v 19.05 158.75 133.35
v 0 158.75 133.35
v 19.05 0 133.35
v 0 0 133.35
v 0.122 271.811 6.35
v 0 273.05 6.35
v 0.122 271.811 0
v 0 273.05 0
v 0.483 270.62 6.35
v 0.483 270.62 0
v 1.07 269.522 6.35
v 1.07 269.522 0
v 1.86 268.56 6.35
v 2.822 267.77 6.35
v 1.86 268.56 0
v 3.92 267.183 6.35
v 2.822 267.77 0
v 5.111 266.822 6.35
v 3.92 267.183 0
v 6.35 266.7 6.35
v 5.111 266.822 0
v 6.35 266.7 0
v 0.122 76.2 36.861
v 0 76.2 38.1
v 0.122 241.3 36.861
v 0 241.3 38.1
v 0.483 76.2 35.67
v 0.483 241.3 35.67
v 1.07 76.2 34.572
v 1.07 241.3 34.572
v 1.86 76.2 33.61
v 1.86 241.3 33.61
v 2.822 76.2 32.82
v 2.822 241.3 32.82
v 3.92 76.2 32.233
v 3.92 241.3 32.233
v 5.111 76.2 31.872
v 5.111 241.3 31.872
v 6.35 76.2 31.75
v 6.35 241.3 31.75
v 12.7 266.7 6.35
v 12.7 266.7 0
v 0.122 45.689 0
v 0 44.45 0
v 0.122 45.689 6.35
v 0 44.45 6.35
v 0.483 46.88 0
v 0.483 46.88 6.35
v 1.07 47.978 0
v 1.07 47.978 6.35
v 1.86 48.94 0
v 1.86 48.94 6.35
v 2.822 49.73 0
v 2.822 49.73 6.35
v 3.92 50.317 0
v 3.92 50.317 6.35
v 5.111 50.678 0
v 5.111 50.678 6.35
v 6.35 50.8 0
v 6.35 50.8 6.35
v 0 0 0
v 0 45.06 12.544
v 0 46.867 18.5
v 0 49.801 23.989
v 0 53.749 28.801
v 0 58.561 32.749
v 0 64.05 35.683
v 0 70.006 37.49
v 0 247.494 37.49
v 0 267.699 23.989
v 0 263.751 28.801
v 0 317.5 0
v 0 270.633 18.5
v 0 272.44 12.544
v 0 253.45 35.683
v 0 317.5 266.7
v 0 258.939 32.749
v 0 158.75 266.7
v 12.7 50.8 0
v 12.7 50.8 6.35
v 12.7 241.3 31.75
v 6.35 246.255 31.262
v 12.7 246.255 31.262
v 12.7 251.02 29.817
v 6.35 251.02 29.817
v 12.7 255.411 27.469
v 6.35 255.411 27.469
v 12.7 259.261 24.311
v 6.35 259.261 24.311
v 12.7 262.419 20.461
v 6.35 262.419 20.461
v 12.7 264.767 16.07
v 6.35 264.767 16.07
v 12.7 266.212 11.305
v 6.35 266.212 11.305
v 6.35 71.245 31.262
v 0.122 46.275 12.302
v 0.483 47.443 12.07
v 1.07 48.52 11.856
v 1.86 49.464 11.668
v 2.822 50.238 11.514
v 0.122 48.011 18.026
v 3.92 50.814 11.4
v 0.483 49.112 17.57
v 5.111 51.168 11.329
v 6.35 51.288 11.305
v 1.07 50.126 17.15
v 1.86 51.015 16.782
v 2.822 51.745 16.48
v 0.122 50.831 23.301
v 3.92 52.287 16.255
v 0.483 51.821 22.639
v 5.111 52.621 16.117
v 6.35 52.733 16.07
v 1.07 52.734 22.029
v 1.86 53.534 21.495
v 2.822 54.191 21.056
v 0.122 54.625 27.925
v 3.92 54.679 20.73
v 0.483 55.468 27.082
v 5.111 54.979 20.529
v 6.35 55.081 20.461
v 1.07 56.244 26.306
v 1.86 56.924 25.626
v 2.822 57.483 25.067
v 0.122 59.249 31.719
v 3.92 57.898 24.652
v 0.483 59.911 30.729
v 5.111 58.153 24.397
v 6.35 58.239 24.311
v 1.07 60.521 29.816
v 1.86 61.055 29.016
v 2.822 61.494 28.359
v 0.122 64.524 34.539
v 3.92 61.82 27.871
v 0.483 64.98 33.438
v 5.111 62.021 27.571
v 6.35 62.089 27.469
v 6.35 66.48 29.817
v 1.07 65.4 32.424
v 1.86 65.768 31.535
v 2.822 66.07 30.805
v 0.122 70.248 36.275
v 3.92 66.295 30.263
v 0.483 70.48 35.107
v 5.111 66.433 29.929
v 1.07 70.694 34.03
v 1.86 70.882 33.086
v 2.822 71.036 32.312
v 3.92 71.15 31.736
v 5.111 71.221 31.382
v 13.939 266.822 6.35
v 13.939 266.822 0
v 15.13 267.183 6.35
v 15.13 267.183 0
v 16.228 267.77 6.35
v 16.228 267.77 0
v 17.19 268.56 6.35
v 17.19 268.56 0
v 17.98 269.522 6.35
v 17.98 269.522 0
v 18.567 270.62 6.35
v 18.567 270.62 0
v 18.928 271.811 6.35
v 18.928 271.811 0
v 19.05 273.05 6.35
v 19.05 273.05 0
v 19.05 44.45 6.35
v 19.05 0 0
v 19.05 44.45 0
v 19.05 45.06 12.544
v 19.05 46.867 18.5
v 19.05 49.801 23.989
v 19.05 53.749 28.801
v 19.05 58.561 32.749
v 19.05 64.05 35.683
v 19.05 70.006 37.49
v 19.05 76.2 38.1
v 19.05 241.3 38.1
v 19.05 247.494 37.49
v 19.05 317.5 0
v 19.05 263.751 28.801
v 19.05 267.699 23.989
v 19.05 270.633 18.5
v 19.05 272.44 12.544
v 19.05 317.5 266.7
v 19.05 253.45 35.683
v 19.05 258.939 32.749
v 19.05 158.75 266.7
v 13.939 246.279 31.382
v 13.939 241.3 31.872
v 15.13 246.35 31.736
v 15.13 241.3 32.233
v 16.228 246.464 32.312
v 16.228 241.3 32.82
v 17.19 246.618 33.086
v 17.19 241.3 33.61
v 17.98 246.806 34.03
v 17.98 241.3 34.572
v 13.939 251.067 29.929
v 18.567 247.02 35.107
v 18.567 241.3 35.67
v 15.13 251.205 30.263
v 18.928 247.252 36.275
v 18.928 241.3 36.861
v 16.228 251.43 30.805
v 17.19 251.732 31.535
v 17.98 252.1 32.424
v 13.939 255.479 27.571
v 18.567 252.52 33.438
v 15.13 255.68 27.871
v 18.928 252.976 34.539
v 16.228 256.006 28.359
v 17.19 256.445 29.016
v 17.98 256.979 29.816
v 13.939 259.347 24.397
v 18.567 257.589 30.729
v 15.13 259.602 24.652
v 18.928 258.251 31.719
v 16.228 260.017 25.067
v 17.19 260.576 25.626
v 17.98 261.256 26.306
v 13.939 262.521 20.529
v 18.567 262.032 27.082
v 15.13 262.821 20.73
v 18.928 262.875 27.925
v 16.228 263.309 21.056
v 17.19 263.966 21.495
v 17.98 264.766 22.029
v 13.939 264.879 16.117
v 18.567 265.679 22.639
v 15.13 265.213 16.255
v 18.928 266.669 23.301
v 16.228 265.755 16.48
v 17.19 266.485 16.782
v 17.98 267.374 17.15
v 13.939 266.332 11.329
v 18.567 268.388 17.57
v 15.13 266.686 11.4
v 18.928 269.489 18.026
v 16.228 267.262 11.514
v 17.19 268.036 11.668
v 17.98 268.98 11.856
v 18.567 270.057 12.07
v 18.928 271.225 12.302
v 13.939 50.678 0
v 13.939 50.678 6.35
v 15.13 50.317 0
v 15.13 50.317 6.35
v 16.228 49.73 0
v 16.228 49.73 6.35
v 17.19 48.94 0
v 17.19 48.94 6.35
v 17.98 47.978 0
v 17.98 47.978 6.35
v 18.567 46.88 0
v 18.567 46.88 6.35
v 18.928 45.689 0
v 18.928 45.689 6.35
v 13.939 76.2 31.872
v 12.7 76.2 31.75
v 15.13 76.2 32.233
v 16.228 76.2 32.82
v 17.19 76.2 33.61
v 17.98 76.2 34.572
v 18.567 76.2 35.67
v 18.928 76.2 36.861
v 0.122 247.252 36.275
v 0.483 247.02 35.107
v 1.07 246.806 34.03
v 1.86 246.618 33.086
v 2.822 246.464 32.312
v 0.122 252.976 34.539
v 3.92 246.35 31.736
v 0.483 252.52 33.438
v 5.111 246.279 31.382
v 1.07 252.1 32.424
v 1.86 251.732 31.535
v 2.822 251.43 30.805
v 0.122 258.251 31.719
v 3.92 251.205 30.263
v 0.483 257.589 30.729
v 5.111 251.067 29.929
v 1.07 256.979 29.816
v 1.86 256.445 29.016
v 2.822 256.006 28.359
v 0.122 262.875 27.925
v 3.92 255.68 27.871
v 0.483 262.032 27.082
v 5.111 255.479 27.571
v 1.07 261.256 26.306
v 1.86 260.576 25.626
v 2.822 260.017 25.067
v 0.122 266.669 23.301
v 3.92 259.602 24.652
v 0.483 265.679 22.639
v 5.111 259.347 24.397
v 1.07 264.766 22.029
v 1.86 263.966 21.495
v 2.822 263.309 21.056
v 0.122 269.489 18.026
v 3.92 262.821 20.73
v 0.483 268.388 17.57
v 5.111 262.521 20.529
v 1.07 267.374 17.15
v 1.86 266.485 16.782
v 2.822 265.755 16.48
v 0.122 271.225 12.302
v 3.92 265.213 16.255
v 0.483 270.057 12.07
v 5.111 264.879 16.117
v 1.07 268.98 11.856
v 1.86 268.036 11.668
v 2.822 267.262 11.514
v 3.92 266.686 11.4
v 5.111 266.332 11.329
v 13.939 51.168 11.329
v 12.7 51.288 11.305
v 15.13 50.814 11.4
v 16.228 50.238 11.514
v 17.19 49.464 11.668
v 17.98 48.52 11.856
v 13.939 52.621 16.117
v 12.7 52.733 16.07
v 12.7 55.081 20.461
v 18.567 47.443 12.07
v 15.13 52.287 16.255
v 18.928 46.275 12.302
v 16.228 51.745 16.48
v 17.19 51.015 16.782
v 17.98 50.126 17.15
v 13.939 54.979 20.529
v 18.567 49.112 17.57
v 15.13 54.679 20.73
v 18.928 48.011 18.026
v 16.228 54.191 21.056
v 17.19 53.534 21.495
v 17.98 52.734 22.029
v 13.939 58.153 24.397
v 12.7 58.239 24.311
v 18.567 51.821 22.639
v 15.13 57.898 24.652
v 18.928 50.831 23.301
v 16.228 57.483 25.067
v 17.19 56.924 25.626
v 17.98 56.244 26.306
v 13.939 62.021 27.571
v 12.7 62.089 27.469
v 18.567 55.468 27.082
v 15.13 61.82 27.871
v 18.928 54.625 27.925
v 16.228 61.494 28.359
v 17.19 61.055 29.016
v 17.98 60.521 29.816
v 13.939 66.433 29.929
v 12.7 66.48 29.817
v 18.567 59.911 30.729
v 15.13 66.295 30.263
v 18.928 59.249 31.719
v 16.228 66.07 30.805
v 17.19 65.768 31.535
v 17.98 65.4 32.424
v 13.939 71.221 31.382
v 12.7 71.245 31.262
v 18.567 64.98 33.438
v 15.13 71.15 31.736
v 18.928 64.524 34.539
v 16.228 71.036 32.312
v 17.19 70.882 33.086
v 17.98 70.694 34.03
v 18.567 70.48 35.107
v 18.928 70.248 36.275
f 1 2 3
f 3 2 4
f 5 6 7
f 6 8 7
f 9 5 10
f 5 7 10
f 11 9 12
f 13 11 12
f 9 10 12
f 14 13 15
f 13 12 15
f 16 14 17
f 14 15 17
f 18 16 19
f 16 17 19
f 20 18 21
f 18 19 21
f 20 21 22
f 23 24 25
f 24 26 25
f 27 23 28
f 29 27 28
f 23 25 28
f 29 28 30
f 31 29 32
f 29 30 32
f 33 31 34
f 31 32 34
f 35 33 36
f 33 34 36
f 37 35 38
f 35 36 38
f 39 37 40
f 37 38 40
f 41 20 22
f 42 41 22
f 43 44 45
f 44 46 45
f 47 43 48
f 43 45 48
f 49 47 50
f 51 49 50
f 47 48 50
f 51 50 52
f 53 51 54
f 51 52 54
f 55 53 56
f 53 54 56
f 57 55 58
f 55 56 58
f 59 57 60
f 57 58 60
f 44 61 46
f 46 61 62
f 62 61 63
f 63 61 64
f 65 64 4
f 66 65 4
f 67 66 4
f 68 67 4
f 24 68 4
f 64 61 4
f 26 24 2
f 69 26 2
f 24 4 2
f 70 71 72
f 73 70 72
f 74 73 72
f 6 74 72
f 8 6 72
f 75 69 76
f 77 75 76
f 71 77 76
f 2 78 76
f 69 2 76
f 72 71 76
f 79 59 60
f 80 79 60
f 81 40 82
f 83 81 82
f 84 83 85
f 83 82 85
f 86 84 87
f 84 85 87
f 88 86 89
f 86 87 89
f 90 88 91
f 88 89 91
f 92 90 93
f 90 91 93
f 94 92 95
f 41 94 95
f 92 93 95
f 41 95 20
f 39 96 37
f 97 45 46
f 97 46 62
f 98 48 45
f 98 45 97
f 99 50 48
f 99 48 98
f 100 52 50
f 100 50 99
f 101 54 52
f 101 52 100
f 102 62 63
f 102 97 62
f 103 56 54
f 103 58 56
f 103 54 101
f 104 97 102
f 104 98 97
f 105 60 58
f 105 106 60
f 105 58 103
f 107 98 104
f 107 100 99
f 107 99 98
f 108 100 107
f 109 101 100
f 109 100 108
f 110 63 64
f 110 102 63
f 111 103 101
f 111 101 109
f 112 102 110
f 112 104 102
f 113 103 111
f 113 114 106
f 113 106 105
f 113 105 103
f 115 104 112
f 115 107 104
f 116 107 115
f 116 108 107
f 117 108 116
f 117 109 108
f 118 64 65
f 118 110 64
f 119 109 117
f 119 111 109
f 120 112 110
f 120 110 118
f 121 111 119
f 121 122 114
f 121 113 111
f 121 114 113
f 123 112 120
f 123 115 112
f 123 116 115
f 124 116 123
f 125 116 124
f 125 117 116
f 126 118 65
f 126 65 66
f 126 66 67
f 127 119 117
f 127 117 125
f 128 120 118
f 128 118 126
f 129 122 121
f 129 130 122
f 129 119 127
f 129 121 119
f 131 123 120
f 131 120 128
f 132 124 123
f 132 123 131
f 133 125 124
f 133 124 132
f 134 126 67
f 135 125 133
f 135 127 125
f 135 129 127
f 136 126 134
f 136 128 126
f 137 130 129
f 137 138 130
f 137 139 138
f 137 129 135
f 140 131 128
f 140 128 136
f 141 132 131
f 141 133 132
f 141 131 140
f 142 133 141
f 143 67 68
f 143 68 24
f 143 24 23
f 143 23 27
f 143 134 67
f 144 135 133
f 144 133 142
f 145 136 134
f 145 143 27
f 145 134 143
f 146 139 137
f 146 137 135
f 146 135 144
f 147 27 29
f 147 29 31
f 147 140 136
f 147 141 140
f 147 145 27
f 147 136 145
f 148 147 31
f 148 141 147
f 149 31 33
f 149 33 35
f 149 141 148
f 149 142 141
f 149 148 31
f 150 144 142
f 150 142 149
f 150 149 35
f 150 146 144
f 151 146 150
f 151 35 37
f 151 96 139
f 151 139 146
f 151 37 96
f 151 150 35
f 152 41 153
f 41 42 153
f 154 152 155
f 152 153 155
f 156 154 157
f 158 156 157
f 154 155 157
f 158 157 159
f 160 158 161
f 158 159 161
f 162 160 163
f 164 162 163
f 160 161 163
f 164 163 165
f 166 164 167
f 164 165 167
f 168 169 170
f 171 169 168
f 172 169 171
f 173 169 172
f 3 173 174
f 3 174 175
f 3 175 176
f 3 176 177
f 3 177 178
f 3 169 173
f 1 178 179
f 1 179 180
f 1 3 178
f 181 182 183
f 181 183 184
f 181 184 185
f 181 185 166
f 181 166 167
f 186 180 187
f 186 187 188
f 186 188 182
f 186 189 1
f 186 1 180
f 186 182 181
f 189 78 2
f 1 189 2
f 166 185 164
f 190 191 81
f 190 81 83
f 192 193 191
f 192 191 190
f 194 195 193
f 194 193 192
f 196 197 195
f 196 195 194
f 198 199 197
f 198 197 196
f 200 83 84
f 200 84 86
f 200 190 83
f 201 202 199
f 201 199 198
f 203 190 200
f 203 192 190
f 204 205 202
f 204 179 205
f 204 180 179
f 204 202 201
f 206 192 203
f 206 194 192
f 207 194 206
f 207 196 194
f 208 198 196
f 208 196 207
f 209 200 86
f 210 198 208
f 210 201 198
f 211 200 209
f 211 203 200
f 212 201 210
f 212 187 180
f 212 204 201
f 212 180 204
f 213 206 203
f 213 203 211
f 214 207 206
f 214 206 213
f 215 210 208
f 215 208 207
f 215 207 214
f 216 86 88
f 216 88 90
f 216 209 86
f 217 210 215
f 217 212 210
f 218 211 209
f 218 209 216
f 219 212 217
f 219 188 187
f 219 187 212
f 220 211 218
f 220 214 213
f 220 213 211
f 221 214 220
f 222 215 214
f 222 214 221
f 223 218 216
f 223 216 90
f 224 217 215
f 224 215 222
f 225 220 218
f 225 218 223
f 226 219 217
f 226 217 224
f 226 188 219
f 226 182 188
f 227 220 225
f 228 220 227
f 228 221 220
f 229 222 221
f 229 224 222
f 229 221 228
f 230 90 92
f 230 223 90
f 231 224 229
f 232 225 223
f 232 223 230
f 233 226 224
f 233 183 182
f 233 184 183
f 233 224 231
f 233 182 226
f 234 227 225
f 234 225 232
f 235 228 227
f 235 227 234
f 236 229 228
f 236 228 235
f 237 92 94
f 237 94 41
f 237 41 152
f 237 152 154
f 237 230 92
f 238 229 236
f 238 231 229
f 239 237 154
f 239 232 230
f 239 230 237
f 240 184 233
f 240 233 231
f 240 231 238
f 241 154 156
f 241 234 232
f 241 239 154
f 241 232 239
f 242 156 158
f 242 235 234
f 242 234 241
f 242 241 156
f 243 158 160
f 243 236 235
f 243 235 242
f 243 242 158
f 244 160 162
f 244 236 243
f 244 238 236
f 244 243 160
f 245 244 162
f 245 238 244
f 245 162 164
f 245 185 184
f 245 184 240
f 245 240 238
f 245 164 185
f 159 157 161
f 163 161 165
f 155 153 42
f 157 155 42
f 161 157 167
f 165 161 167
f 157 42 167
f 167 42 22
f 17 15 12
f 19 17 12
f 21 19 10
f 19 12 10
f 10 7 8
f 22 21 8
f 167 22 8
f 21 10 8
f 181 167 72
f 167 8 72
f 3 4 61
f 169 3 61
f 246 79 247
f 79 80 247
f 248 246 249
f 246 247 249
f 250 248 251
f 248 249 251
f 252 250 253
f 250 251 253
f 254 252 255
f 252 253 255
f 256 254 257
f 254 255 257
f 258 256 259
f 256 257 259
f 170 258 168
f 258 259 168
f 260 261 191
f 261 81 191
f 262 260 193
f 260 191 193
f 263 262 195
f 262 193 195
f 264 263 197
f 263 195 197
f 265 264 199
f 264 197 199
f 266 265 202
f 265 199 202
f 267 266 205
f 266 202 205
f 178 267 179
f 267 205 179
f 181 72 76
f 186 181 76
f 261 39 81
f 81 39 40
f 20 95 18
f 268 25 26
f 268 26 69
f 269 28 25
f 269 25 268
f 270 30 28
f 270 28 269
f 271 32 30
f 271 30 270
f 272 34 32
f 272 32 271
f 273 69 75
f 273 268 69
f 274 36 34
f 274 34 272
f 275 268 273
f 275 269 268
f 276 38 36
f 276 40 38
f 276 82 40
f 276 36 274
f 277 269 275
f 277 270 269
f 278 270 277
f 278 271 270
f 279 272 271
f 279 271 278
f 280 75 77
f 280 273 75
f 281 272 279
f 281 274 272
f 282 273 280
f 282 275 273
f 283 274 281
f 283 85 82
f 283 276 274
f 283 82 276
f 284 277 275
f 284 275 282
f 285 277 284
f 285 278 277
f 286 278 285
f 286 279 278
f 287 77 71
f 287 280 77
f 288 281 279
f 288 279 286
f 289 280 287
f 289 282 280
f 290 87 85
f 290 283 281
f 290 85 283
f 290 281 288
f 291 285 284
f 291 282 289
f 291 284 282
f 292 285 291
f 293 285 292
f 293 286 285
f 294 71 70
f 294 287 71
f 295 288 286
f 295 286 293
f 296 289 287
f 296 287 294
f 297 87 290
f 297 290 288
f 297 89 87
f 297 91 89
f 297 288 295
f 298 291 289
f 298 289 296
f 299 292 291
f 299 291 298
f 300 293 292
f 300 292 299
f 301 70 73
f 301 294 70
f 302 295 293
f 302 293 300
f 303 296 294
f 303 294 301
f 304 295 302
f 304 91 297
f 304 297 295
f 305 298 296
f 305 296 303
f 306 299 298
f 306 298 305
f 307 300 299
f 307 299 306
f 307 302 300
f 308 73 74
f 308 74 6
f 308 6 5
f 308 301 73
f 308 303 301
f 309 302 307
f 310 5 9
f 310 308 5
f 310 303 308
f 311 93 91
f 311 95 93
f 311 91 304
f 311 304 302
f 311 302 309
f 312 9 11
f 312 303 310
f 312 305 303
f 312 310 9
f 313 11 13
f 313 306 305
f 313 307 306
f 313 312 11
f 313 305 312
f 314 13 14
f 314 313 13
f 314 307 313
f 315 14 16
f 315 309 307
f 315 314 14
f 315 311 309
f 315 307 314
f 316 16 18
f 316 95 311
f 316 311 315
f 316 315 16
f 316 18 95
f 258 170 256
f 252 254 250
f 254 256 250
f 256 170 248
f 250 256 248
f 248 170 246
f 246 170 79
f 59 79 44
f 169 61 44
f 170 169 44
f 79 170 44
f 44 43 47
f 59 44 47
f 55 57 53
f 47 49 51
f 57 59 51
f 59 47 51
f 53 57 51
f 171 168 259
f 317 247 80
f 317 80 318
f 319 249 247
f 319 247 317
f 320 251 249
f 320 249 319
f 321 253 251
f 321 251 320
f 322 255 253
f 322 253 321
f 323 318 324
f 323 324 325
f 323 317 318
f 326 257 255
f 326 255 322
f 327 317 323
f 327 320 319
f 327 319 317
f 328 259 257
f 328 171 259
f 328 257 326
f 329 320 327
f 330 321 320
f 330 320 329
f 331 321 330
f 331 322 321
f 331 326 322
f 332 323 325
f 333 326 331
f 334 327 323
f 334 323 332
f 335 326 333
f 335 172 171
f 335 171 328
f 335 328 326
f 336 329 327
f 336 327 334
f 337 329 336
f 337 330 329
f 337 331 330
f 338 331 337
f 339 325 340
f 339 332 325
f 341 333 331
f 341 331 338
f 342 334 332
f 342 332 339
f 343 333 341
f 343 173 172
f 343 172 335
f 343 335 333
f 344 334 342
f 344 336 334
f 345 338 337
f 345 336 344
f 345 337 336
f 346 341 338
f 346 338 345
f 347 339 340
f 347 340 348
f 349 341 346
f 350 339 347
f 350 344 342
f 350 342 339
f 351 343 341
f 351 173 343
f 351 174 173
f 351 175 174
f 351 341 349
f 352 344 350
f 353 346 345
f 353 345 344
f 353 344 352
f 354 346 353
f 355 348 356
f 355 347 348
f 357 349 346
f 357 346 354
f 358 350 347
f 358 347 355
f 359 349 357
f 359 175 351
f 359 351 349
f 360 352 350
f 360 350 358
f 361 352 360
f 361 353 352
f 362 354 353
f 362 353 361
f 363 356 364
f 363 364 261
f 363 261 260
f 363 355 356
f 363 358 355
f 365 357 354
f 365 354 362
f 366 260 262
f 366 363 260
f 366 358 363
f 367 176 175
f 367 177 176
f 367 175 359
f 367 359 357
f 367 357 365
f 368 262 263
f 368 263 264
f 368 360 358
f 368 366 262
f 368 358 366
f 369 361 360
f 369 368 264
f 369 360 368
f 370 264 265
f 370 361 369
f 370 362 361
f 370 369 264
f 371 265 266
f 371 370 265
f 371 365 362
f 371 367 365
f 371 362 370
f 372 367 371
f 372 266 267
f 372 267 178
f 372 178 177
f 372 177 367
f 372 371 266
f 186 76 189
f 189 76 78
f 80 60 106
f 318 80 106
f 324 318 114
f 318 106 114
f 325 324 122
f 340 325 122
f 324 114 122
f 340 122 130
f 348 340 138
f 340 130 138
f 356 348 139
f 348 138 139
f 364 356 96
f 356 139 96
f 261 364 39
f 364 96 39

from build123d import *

# Parameters (mm, degrees)
F1_DEPTH = 19.05
F2_R     = 6.35
F3_R     = 6.35


with BuildPart() as f1:
    # F0 (on Right) → F1 (new body)
    with BuildSketch(Plane.YZ):
        with BuildLine():
            Line((0, 133.35), (0, 0))
            Line((0, 0), (50.8, 0))
            Line((50.8, 0), (50.8, 6.35))
            ThreePointArc((50.8, 6.35), (58.239488, 24.310512), (76.2, 31.75))
            Line((76.2, 31.75), (241.3, 31.75))
            ThreePointArc((241.3, 31.75), (259.260512, 24.310512), (266.7, 6.35))
            Line((266.7, 6.35), (266.7, 0))
            Line((266.7, 0), (317.5, 0))
            Line((317.5, 0), (317.5, 266.7))
            Line((317.5, 266.7), (158.75, 266.7))
            Line((158.75, 266.7), (158.75, 133.35))
            Line((158.75, 133.35), (0, 133.35))
        make_face()
    extrude(amount=F1_DEPTH)

    # F2
    f2_edges = [f1.edges().sort_by_distance(p)[0] for p in [
        (19.05, 158.75, 31.75),
    ]]
    fillet(f2_edges, radius=F2_R)

    # F3
    f3_edges = [f1.edges().sort_by_distance(p)[0] for p in [
        (0, 158.75, 31.75),
    ]]
    fillet(f3_edges, radius=F3_R)


solid = f1.part
